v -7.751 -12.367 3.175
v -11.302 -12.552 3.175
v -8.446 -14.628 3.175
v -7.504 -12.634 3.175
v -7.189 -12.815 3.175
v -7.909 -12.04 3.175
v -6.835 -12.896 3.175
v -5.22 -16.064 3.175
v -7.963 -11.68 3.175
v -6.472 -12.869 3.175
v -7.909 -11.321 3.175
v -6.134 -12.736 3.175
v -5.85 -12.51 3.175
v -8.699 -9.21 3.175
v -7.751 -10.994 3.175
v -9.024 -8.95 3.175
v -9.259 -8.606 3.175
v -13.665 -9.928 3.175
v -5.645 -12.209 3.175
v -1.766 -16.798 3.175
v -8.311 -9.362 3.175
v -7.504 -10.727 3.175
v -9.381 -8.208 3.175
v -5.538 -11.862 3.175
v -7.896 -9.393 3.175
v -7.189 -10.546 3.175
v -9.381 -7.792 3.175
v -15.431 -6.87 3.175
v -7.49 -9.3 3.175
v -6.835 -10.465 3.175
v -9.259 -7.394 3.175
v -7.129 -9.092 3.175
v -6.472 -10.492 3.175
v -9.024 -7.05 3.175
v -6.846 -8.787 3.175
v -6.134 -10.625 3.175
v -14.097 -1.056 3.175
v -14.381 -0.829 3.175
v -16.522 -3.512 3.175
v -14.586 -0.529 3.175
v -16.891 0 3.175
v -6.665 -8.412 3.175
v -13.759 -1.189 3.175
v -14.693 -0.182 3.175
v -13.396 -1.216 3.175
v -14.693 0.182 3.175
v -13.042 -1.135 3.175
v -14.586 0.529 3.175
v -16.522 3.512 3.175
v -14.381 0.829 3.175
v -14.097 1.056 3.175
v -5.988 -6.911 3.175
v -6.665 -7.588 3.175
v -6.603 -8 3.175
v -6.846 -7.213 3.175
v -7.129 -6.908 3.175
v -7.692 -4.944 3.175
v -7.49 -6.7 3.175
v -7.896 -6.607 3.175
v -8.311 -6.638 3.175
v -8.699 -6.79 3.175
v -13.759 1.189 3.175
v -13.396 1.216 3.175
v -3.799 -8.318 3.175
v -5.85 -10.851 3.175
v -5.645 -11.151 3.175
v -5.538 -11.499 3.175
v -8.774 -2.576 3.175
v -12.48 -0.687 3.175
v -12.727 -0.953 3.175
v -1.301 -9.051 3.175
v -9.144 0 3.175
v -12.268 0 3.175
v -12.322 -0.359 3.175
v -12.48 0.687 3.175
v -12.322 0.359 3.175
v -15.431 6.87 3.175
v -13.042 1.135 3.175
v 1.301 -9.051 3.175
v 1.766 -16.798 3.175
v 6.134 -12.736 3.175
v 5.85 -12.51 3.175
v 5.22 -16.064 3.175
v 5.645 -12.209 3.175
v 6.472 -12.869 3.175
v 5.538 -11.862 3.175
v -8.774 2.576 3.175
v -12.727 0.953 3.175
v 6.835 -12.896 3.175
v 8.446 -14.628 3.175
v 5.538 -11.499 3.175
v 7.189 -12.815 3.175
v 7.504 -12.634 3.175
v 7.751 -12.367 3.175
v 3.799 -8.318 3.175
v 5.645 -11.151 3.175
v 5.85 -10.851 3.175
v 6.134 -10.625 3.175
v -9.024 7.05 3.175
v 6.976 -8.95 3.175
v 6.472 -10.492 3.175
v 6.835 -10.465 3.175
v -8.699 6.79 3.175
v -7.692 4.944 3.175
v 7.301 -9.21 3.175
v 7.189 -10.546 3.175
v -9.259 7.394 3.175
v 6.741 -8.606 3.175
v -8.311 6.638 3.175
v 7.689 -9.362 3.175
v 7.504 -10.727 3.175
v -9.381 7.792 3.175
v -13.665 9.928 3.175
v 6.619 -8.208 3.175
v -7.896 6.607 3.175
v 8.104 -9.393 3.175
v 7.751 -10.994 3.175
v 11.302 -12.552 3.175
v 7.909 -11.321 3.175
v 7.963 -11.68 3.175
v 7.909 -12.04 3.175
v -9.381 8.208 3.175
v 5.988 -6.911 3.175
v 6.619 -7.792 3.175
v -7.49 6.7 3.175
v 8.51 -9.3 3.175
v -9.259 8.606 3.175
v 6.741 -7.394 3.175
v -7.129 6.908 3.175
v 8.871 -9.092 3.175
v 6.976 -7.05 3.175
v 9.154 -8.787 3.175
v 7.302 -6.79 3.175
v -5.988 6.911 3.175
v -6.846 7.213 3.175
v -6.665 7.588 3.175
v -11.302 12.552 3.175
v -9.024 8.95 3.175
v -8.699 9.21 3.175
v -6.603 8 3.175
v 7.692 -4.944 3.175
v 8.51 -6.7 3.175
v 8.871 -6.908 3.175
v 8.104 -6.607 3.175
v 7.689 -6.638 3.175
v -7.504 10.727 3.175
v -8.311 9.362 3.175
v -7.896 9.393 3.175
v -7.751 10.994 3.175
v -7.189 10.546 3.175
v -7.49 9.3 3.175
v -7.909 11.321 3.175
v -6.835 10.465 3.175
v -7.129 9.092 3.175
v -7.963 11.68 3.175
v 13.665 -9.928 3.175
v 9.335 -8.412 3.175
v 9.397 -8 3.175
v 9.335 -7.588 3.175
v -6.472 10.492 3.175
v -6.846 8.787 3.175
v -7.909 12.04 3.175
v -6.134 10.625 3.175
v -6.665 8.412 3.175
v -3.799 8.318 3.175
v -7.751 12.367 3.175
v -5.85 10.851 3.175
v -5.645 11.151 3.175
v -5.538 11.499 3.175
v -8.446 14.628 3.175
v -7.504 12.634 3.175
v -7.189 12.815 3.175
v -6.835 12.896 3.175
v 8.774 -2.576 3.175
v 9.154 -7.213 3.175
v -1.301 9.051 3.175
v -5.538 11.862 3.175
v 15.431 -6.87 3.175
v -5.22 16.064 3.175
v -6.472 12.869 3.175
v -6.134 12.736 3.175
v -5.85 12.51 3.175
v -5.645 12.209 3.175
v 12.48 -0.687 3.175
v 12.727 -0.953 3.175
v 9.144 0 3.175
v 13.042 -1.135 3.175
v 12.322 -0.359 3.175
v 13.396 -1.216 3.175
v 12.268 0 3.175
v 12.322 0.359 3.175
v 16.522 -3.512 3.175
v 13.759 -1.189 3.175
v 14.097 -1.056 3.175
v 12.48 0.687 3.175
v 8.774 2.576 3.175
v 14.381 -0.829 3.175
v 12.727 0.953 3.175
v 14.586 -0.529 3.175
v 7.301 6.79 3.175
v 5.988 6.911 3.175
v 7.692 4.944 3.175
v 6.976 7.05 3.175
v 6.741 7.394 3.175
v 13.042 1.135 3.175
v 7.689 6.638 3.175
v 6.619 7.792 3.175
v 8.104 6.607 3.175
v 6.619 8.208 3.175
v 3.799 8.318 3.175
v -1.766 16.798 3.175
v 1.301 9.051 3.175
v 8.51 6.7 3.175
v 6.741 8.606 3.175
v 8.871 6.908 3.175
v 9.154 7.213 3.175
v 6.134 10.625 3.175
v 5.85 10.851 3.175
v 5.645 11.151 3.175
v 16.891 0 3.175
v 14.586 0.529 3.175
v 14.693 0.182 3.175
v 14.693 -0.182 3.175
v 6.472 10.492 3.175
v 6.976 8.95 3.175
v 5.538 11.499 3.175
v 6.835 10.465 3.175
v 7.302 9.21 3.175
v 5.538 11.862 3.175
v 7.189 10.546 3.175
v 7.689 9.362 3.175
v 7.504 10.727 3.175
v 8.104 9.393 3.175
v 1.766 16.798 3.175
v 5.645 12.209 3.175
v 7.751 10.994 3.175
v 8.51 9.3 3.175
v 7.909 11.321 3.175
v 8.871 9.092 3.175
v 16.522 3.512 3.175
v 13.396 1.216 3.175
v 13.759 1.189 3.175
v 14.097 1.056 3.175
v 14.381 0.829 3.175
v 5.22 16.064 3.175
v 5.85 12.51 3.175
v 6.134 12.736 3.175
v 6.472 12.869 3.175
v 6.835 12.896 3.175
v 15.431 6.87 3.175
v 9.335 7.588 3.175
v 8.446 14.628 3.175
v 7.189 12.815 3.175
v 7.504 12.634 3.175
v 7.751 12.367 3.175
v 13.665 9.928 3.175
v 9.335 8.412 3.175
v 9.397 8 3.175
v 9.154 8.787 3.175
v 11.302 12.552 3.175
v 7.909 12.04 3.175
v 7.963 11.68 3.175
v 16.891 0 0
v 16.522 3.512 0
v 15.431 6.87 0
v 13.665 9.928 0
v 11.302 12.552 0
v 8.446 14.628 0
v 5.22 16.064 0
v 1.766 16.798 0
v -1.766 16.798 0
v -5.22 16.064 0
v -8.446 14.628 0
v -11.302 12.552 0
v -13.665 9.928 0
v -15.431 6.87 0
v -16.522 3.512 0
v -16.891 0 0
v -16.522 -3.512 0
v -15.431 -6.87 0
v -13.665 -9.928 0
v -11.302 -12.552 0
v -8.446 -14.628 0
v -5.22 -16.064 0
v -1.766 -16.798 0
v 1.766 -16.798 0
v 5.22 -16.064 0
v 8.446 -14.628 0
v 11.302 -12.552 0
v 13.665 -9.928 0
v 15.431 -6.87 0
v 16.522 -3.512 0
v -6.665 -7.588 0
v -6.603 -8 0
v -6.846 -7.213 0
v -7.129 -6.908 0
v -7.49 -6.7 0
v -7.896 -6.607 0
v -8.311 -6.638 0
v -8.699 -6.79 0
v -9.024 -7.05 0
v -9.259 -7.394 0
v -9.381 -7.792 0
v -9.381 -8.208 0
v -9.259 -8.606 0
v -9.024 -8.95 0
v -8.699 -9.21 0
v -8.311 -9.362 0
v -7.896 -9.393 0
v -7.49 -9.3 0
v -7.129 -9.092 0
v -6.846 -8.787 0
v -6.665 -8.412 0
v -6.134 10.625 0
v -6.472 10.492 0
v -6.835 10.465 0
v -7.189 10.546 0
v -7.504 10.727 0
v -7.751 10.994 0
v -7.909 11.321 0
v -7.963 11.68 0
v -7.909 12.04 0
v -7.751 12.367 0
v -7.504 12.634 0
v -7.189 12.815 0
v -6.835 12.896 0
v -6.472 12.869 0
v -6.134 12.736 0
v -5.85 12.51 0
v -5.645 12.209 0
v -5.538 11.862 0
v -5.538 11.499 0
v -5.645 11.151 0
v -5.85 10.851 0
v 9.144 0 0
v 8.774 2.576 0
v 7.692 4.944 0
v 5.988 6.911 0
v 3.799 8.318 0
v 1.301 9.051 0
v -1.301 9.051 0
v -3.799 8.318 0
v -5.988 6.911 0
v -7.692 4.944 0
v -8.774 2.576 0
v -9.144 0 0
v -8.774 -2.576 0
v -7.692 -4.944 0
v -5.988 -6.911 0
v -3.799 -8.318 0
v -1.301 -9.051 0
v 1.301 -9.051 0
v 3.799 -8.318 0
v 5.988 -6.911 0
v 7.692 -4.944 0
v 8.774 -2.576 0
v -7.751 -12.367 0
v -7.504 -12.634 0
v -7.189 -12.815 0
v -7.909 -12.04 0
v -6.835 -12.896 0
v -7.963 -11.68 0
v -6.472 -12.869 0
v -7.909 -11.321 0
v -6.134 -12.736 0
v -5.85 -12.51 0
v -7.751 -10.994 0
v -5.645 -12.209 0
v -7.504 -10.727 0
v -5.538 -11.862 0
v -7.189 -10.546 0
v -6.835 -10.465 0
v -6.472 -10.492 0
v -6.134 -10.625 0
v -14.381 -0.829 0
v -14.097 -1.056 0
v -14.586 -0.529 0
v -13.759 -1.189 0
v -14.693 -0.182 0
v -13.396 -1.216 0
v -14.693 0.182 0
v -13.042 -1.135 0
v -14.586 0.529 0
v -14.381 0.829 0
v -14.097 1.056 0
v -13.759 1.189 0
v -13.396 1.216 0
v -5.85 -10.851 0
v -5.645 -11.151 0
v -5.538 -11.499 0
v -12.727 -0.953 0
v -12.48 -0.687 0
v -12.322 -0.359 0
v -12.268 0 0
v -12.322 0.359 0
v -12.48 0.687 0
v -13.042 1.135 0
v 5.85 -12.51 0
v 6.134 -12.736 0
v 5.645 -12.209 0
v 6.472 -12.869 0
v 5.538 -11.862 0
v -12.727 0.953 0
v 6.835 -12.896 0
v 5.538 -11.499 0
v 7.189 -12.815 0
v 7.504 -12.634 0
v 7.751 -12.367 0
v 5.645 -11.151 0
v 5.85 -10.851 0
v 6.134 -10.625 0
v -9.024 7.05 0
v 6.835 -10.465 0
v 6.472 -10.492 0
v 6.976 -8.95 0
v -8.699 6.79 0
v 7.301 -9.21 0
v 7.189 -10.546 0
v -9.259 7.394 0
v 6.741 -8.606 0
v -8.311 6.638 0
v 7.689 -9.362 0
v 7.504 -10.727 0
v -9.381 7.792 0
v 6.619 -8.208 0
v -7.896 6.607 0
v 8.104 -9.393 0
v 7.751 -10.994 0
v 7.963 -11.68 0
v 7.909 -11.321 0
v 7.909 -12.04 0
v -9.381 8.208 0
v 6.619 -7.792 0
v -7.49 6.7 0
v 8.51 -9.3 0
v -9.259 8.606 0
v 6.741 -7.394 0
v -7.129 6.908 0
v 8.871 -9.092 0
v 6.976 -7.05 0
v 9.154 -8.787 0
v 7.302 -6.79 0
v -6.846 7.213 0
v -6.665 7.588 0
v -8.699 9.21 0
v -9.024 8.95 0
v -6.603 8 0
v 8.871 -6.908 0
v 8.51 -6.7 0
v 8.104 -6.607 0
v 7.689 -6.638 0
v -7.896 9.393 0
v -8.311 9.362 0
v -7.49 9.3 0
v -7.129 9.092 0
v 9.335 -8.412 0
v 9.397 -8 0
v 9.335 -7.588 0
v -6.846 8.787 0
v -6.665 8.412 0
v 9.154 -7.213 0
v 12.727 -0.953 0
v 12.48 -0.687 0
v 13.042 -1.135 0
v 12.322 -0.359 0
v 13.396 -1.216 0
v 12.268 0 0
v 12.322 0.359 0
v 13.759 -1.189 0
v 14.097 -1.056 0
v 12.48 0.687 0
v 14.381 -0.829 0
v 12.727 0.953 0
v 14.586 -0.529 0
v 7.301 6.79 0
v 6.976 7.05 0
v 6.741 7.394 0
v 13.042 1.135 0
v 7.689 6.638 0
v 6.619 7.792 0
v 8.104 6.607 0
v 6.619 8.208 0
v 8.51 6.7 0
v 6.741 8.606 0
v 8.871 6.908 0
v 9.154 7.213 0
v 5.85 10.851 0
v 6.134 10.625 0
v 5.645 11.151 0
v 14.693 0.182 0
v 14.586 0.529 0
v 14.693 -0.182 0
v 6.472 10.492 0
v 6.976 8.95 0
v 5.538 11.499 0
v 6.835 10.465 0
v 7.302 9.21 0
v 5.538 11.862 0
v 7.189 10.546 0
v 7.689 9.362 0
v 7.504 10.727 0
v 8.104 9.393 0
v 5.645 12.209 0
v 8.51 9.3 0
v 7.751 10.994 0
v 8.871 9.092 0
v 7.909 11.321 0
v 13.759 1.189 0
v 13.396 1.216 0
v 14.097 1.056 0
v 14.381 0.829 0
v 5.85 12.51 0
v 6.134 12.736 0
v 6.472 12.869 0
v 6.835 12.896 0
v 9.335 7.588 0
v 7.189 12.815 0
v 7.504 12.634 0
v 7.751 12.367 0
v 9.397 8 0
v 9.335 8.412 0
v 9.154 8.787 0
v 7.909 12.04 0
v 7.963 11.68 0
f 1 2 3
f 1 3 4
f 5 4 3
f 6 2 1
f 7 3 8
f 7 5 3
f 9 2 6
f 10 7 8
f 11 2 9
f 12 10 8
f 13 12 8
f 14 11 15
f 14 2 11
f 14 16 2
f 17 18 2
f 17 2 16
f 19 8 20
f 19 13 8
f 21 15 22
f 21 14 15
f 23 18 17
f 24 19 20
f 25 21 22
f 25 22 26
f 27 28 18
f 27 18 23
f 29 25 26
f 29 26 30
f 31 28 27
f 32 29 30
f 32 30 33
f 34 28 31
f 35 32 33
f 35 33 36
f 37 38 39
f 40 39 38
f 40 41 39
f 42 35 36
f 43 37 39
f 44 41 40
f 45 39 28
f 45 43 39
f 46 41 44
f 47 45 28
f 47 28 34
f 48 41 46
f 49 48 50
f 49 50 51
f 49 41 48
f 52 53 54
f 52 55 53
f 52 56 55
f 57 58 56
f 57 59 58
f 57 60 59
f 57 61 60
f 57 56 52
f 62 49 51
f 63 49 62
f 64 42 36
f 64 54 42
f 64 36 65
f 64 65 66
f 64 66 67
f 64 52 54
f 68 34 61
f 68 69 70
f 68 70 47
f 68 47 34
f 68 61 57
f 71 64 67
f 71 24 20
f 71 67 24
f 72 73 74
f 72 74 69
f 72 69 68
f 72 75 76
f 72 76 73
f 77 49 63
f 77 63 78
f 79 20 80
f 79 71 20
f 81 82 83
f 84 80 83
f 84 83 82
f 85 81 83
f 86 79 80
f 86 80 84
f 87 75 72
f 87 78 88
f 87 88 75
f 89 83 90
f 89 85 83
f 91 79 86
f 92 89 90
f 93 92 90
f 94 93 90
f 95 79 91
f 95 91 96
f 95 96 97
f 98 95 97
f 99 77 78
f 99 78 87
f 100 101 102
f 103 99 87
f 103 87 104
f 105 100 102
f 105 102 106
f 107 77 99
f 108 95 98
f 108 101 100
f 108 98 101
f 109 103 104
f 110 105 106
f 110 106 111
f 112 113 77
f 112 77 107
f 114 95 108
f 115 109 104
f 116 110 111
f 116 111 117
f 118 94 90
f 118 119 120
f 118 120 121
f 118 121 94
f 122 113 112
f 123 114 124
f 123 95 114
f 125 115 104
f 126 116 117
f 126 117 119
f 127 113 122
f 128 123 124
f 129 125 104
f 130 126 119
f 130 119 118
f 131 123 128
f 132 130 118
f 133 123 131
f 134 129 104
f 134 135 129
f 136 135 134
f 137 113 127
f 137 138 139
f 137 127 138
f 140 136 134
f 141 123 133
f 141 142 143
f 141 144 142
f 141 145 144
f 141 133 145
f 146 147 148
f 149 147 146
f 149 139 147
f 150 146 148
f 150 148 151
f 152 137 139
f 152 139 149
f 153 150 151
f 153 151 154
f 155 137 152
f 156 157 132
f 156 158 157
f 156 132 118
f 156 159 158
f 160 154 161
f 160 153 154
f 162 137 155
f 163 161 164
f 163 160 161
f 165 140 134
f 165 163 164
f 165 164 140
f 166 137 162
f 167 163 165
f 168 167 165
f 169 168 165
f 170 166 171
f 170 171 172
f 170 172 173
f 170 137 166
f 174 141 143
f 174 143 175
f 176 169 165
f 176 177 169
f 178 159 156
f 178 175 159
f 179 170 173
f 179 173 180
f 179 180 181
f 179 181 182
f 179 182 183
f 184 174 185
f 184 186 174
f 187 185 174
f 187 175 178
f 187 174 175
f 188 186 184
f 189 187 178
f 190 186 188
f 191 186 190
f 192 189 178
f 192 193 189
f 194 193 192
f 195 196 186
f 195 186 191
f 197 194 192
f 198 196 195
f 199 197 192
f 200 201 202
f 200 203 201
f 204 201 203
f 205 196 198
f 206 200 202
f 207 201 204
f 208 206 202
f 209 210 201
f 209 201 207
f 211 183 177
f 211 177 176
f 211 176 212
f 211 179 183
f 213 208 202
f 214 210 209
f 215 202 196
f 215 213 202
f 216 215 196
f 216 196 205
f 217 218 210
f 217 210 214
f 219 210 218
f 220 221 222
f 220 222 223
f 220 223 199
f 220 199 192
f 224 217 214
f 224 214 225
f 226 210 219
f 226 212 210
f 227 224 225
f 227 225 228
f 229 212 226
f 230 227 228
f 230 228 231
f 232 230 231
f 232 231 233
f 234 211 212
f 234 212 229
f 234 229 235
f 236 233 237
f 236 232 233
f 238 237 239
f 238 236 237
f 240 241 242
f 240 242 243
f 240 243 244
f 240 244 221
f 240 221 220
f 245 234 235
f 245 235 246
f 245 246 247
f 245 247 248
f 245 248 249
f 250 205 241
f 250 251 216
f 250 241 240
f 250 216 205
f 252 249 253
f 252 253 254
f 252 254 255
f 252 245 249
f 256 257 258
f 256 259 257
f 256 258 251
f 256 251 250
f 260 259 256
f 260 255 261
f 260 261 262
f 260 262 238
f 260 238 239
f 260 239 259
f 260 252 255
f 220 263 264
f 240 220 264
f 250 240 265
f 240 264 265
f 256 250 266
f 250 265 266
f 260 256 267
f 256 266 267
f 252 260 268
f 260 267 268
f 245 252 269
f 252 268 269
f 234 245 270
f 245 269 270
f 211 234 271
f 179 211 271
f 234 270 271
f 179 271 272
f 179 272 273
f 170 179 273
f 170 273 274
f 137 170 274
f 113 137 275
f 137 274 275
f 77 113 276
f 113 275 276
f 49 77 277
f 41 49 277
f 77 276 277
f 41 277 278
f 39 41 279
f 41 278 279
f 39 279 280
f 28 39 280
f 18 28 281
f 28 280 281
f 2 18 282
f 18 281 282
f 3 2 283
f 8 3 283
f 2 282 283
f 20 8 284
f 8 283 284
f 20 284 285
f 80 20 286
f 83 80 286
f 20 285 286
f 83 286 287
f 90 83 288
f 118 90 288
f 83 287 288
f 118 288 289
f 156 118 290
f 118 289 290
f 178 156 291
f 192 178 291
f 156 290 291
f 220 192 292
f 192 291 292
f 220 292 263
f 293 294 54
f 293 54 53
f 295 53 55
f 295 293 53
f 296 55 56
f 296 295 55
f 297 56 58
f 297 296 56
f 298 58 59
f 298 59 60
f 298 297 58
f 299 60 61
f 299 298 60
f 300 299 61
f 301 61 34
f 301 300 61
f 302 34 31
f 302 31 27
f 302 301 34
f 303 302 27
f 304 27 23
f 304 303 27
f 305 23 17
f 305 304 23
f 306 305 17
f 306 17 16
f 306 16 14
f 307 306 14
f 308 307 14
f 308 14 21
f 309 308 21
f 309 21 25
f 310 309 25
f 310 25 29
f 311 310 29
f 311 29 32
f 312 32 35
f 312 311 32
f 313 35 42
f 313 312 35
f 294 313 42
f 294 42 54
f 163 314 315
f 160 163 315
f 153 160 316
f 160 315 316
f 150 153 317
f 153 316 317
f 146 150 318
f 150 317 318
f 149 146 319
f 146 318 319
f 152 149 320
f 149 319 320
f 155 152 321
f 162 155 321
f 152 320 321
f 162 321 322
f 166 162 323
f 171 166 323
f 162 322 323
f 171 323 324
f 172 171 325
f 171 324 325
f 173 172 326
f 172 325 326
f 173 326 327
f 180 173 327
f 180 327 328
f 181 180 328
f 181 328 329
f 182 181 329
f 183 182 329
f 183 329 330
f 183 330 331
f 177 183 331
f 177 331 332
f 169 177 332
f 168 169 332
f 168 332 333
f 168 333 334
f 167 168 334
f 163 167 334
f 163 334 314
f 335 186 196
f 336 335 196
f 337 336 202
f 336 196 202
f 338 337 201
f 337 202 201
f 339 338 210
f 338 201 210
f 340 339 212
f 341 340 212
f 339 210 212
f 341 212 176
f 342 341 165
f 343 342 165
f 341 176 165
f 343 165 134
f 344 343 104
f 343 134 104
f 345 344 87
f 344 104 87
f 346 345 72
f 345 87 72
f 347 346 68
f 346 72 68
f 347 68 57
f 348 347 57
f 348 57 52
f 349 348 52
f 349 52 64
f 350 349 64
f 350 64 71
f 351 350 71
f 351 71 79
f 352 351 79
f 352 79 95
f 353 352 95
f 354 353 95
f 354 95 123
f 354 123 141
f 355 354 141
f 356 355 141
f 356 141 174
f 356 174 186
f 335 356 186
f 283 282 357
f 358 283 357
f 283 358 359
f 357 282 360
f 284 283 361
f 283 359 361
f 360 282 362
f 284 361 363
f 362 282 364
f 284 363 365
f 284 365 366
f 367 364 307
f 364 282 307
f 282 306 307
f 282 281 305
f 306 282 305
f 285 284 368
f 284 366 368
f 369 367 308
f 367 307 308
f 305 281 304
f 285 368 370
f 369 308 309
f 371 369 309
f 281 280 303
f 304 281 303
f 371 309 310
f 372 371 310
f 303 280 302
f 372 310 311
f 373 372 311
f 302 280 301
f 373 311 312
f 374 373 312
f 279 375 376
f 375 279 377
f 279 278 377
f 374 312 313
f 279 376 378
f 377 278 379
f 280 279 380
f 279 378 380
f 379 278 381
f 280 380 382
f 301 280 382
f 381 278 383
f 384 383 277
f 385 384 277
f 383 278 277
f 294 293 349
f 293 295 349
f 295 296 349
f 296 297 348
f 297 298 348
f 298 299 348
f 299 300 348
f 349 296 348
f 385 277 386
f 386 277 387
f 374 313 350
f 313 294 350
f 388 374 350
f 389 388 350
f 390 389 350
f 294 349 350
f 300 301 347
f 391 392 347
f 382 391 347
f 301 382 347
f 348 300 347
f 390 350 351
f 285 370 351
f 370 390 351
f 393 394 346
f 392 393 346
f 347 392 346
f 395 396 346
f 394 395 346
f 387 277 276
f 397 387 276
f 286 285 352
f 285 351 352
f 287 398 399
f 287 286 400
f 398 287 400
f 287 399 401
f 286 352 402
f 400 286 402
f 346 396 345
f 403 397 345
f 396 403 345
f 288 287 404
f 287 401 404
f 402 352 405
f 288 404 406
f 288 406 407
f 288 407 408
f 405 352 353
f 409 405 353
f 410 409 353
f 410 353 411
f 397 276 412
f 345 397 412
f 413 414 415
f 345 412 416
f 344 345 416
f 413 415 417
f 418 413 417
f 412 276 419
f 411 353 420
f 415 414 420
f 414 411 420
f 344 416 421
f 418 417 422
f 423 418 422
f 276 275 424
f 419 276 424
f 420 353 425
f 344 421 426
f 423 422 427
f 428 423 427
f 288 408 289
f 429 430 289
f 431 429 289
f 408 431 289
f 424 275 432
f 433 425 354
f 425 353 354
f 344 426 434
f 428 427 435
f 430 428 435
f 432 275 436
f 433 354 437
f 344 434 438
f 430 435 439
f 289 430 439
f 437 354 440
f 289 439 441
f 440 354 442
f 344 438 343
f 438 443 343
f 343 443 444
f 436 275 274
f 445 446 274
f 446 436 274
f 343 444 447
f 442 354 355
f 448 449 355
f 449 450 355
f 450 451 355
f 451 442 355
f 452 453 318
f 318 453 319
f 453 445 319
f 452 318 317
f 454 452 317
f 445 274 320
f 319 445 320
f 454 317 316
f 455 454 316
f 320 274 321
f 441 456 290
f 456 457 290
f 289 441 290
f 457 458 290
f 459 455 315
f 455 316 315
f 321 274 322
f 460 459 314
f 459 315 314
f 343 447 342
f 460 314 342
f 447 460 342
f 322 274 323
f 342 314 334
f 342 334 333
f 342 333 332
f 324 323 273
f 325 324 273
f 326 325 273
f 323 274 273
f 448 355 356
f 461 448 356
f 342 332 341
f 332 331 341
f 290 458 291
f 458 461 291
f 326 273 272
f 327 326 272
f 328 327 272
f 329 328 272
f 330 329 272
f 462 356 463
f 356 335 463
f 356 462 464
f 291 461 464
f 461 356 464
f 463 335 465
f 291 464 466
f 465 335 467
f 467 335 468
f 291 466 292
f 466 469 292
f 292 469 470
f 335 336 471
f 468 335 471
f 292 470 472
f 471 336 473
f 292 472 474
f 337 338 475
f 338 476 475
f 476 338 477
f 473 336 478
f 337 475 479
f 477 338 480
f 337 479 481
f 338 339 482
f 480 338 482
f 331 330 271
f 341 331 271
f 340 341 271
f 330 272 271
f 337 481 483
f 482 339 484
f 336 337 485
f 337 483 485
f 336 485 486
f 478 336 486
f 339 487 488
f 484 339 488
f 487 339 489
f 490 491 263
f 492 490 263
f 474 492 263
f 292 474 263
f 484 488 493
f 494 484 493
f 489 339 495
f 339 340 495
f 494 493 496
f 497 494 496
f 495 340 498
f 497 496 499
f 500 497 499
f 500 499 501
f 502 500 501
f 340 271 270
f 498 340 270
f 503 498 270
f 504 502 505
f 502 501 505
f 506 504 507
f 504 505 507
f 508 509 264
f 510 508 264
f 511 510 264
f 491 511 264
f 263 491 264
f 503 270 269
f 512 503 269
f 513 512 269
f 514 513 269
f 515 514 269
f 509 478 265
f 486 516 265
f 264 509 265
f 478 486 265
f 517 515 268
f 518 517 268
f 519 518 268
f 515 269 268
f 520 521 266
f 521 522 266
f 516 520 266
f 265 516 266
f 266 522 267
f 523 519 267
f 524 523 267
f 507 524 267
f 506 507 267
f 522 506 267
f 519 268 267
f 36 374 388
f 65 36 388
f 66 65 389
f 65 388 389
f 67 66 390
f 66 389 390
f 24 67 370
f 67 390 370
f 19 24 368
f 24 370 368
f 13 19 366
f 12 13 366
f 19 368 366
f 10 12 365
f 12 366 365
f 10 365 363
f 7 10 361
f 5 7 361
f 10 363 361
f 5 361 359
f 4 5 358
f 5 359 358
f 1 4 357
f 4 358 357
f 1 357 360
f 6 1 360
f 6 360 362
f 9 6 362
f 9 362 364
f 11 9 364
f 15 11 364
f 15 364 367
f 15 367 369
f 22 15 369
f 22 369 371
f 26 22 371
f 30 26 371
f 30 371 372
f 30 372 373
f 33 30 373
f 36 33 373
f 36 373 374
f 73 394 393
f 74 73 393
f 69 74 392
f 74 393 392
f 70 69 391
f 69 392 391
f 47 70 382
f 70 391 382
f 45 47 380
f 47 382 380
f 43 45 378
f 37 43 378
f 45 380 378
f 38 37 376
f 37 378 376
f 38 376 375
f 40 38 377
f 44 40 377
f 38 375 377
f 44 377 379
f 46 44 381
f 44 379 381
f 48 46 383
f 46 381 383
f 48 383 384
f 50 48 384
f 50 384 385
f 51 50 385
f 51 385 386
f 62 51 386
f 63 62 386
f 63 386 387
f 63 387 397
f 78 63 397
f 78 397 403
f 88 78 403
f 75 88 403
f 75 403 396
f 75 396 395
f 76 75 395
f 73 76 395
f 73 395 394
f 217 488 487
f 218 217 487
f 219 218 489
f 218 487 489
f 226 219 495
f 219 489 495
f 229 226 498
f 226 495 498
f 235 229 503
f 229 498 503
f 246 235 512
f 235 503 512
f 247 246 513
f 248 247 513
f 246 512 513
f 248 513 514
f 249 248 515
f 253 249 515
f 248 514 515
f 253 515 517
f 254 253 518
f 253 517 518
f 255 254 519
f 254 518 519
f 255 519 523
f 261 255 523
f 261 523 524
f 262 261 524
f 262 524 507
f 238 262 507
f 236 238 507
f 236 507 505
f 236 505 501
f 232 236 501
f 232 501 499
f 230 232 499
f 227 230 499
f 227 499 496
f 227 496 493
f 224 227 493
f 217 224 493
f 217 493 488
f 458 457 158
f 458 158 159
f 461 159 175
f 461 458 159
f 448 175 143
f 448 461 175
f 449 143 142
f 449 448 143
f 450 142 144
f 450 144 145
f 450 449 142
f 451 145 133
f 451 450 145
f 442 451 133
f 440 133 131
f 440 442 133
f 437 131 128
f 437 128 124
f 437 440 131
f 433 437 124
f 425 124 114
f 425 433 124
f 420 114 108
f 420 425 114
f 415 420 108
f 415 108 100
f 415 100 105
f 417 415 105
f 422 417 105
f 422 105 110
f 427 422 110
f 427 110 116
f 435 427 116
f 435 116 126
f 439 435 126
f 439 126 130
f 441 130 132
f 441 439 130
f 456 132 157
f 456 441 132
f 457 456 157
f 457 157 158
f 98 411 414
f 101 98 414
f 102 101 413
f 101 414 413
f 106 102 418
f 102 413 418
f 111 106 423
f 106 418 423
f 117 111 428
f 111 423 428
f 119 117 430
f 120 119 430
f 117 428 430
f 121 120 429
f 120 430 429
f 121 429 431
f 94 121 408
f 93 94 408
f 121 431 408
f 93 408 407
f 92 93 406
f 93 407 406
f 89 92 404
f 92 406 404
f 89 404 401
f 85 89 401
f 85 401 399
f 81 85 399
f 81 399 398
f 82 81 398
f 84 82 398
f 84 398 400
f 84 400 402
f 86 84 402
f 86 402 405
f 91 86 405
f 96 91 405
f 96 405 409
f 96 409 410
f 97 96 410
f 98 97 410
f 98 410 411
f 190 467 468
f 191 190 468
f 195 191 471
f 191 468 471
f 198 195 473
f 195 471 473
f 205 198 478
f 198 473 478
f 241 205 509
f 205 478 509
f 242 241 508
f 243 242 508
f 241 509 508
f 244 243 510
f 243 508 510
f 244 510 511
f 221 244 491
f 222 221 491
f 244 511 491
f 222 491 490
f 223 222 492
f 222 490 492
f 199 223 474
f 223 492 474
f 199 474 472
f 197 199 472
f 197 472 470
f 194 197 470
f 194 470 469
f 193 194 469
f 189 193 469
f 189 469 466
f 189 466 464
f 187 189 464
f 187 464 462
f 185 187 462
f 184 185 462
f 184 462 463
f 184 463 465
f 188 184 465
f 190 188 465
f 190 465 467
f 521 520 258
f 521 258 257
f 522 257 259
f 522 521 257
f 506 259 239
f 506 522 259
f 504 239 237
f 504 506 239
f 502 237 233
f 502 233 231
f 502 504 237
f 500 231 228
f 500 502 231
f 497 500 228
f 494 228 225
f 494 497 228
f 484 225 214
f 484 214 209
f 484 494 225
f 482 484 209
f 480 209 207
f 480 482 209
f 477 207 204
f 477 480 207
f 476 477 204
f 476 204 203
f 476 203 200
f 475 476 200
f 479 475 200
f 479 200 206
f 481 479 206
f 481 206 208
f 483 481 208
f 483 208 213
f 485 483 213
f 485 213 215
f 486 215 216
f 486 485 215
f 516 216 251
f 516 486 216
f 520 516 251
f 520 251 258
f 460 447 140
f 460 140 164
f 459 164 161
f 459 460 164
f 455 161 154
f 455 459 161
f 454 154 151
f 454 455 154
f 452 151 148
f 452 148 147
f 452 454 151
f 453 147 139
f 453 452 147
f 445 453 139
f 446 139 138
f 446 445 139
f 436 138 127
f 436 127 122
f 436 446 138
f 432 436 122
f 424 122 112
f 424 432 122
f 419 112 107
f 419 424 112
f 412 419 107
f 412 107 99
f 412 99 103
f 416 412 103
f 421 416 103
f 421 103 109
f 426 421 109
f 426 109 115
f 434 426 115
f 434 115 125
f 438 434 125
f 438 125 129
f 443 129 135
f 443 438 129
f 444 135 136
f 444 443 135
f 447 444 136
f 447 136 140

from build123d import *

# Parameters (mm, degrees)
SKETCH1_R                     = 16.891
BOSS_EXTRUDE1_DEPTH           = 3.175
F_2_CLEARANCE_HOLE1_D         = 2.4384
CIRPATTERN1_COUNT             = 6
F_3_CLEARANCE_HOLE1_OUTLINE_R = 1.397
F_3_CLEARANCE_HOLE1_DEPTH     = 3.175
SKETCH12_R                    = 9.144
CUT_EXTRUDE1_DEPTH            = 25.097559773


# Read off the part's stored shape, not the designer's step: #3 Clearance Hole1
with BuildPart() as part:
    # Sketch1 → Boss-Extrude1 (new body)
    with BuildSketch(Plane.XY):
        Circle(SKETCH1_R)
    extrude(amount=BOSS_EXTRUDE1_DEPTH)

    # #2 Clearance Hole1 (through all)
    with Locations(Plane.XY.offset(3.175)):
        with Locations((13.4874, 0)):
            f_2_clearance_hole1 = Hole(F_2_CLEARANCE_HOLE1_D / 2)

    # CirPattern1: #2 Clearance Hole1 ×6 about axis
    cirpattern1_axis = Axis((0, 0, 0), (0, 0, 1))
    for i in range(1, CIRPATTERN1_COUNT):
        add(f_2_clearance_hole1.rotate(cirpattern1_axis, i * 360 / CIRPATTERN1_COUNT), mode=Mode.SUBTRACT)

    # #3 Clearance Hole1 outline → #3 Clearance Hole1 (cut)
    with BuildSketch(Plane.XY):
        with Locations((-8, 8)):
            Circle(F_3_CLEARANCE_HOLE1_OUTLINE_R)
        with Locations((8, -8)):
            Circle(F_3_CLEARANCE_HOLE1_OUTLINE_R)
        with Locations((-8, -8)):
            Circle(F_3_CLEARANCE_HOLE1_OUTLINE_R)
        with Locations((8, 8)):
            Circle(F_3_CLEARANCE_HOLE1_OUTLINE_R)
    extrude(amount=F_3_CLEARANCE_HOLE1_DEPTH, mode=Mode.SUBTRACT)

    # Sketch12 → Cut-Extrude1 (cut, through all)
    with BuildSketch(Plane.XY.offset(3.175)):
        Circle(SKETCH12_R)
    extrude(amount=-CUT_EXTRUDE1_DEPTH, mode=Mode.SUBTRACT)


solid = part.part
